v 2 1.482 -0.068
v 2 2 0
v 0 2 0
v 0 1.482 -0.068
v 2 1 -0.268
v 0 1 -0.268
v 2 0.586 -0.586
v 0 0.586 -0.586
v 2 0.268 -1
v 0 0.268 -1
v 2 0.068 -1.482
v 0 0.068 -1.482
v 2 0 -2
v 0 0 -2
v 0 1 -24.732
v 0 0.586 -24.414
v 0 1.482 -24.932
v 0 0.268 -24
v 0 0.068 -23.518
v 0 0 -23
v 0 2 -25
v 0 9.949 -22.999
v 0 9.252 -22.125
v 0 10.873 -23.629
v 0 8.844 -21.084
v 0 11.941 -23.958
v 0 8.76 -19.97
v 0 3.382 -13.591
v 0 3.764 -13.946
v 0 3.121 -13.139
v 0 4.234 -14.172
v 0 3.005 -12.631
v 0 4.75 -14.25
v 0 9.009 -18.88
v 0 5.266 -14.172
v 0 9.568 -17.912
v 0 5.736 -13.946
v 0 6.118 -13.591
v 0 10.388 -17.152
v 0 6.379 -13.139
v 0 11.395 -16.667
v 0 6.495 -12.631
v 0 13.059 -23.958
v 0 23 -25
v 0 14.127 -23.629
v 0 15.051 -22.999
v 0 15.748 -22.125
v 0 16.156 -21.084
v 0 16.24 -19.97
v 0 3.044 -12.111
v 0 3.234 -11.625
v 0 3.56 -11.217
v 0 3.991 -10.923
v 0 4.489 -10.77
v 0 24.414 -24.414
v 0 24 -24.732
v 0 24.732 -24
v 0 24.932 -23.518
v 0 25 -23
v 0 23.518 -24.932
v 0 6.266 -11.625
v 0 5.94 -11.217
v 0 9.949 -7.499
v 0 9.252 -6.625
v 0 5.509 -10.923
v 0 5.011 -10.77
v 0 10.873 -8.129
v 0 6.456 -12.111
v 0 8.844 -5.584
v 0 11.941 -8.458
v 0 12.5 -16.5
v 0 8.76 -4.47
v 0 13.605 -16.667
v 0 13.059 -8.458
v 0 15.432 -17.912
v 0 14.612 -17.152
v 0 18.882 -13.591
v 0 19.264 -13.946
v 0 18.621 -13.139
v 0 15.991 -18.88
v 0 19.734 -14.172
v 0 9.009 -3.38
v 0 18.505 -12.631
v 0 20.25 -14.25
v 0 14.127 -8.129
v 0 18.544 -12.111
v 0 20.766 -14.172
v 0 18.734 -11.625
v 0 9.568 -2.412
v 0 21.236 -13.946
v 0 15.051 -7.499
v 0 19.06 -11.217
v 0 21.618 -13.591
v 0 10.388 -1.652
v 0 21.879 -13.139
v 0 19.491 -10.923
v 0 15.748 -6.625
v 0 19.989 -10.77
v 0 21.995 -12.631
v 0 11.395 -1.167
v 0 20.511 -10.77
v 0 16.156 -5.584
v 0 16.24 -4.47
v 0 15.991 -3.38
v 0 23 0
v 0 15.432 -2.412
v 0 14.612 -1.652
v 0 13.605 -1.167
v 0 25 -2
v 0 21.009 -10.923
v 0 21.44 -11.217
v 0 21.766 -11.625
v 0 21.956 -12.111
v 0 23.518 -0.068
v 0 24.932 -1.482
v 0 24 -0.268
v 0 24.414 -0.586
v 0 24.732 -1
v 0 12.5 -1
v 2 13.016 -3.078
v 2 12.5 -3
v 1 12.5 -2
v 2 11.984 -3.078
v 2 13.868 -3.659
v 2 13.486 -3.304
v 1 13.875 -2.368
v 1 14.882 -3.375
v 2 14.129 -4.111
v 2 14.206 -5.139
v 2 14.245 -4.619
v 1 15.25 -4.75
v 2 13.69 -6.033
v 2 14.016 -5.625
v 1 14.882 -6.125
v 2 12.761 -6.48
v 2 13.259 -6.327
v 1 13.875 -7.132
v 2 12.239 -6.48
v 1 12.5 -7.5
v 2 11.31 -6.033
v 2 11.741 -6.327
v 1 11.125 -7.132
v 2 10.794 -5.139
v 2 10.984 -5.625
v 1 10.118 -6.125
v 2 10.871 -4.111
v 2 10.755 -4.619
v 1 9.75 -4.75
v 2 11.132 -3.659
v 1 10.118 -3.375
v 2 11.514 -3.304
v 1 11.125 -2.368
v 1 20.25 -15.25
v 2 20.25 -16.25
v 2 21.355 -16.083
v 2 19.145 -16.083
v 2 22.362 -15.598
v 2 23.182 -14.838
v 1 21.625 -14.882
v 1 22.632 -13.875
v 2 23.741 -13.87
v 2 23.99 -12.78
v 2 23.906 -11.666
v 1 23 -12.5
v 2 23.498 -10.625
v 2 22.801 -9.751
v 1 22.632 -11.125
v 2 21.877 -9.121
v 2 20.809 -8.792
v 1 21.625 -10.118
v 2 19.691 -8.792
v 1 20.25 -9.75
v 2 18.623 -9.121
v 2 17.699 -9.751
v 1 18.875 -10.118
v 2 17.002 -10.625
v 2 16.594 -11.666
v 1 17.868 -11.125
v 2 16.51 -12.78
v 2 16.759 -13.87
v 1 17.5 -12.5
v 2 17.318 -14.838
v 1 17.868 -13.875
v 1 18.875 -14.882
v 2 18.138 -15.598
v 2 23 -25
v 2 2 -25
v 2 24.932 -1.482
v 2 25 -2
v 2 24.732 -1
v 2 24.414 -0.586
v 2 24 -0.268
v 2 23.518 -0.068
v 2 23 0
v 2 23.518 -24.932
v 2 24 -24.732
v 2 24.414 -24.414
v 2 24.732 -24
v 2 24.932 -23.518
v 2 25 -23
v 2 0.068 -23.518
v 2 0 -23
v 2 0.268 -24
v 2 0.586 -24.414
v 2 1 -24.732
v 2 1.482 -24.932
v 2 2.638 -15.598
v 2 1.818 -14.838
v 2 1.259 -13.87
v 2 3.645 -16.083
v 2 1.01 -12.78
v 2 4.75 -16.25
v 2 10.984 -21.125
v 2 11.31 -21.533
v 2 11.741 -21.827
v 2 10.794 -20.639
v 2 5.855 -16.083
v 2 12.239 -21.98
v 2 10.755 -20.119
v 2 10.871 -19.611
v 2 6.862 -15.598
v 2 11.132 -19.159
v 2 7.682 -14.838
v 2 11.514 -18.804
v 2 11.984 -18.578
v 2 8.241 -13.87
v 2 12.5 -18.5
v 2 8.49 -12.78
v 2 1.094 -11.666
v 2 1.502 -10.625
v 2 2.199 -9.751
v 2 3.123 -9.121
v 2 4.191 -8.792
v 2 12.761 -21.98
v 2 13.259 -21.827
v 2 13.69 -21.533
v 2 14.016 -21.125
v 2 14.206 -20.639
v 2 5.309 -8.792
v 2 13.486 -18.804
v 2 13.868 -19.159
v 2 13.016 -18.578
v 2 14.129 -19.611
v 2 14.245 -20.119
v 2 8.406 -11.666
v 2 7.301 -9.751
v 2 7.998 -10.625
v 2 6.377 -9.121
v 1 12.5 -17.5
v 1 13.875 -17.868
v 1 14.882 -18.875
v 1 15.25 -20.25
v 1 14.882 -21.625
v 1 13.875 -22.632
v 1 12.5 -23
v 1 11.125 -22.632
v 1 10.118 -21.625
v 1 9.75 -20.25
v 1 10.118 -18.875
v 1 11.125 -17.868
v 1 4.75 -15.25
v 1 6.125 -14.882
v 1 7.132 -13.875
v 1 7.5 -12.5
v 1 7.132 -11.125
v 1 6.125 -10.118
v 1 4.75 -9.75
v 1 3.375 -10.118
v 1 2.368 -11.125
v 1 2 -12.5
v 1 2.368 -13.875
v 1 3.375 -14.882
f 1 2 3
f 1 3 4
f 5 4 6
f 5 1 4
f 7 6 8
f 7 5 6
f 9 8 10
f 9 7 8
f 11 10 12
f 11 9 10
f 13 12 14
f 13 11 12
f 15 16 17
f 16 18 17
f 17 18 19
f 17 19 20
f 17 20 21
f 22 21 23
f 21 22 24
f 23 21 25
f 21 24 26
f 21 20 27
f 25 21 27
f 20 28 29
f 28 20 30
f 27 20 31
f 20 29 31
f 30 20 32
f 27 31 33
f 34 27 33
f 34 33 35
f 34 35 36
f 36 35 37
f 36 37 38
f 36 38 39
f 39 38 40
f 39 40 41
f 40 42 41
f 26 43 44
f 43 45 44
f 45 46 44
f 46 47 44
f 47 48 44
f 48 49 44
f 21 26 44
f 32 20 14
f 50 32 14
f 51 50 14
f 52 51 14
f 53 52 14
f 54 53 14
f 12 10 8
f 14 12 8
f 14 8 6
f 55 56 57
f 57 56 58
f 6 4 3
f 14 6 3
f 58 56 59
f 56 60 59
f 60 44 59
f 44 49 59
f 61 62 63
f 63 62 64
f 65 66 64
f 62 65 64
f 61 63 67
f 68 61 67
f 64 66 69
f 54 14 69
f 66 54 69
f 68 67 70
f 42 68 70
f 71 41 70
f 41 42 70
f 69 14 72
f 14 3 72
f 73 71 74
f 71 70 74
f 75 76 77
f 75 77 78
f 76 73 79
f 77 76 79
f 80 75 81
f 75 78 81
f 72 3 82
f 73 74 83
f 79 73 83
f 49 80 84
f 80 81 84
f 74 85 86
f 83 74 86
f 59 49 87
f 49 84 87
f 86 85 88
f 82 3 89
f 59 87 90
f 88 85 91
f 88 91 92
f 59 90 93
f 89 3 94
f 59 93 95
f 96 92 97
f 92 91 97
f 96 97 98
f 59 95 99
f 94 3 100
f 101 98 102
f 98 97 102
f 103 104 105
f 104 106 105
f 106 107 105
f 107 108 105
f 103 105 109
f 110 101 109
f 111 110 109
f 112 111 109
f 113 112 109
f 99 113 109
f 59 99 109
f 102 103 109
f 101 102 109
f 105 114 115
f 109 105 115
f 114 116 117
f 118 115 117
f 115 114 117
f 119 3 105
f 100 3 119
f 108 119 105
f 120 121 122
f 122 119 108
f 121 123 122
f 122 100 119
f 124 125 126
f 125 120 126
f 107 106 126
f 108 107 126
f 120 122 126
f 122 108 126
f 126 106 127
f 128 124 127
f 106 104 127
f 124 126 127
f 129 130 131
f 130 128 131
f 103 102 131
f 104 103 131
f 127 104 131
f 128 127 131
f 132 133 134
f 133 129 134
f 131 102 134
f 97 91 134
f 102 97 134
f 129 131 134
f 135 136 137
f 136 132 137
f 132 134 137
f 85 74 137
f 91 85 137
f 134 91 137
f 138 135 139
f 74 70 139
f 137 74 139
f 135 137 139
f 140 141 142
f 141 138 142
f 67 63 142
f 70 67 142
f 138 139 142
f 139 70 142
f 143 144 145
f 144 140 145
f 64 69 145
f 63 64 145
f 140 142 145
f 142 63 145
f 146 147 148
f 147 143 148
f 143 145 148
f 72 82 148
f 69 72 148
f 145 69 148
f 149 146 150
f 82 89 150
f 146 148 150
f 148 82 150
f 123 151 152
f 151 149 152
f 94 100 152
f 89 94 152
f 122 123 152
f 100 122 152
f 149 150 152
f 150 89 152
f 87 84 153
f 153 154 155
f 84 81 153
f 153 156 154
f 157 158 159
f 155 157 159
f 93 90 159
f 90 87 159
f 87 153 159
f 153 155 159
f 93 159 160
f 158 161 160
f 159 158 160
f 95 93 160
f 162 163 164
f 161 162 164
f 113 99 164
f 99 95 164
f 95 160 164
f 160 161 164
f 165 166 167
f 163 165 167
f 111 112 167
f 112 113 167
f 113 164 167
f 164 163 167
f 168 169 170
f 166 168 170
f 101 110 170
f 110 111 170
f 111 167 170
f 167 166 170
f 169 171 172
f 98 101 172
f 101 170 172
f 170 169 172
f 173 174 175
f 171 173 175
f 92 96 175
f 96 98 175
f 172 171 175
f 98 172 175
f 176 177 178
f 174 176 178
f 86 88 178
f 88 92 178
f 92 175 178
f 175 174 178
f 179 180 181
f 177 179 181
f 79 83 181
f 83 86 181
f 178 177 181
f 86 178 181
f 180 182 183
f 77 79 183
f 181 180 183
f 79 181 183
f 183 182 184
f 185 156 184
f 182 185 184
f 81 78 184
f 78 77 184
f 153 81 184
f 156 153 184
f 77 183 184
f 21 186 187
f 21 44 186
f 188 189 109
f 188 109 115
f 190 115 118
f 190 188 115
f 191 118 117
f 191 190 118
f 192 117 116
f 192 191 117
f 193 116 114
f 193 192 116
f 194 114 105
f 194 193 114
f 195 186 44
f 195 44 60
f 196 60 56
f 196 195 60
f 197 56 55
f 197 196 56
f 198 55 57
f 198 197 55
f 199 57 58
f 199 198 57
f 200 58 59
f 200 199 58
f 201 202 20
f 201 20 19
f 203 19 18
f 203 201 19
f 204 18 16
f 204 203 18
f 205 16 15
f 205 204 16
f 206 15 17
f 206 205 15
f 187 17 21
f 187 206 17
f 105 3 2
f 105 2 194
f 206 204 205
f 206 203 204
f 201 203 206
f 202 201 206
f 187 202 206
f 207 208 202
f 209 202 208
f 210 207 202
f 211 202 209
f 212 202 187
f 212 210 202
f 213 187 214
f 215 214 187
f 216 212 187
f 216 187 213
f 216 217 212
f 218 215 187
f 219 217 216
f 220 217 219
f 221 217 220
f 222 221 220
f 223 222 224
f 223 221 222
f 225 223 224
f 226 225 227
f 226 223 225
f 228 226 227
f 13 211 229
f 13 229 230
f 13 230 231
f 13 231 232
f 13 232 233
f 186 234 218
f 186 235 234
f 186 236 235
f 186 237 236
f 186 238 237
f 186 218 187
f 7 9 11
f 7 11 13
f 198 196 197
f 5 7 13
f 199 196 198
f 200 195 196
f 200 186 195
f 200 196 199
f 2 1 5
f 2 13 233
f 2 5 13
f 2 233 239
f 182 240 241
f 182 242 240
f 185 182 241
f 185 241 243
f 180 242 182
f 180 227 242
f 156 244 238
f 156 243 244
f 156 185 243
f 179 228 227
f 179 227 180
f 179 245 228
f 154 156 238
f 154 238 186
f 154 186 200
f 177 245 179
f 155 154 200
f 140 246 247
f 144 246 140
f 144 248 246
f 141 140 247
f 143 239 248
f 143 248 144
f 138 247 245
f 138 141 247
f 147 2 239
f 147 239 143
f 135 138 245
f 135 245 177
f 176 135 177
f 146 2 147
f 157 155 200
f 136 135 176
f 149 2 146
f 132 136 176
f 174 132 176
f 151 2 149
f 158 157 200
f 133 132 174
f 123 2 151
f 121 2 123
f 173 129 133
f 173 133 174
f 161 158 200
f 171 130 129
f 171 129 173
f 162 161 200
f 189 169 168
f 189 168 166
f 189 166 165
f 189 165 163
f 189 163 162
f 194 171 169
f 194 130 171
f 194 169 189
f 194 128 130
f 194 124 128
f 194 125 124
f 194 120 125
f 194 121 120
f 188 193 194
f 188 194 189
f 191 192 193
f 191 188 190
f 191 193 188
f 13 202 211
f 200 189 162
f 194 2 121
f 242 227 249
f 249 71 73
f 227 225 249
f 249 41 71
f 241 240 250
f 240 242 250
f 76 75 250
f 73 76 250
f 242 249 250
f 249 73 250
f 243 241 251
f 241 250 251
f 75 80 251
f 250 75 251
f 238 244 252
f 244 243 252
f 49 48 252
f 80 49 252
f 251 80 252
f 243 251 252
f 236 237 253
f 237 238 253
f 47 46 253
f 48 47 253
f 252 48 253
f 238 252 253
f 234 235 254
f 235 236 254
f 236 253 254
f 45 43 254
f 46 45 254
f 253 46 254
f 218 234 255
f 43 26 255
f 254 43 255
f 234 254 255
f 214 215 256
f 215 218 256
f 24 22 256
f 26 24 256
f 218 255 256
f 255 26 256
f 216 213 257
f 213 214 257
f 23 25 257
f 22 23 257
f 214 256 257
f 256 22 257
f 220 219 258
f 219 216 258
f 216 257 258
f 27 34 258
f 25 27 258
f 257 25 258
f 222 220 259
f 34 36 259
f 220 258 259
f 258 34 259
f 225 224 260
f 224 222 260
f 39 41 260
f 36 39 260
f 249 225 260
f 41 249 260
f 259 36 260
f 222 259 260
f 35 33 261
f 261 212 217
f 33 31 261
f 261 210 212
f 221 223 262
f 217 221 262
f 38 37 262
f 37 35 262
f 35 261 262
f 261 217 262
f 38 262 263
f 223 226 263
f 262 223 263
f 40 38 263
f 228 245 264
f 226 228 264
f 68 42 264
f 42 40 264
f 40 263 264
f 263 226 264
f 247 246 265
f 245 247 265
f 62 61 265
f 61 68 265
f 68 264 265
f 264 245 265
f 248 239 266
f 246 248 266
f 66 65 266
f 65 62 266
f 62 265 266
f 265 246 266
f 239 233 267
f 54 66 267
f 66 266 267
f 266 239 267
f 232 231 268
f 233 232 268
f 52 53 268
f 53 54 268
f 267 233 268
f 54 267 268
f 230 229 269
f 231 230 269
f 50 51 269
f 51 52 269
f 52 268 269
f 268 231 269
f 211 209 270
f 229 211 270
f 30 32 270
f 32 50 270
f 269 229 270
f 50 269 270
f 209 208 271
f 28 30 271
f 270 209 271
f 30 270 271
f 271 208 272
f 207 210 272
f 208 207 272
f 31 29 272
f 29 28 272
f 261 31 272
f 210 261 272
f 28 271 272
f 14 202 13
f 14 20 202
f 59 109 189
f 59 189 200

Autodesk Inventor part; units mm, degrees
ref_plane "YZ Plane" through (0, 0, 0) normal (1, 0, 0) x (0, 1, 0)
ref_plane "XZ Plane" through (0, 0, 0) normal (0, 1, 0) x (-1, 0, 0)
ref_plane "XY Plane" through (0, 0, 0) normal (0, 0, 1) x (1, 0, 0)
sketch "Esboço1" plane through (0, 0, 0) normal (1, 0, 0) x (0, 1, 0)
  line L0 (0, 0) -> (25, 0)
  line L1 (25, 0) -> (25, -25)
  line L2 (25, -25) -> (0, -25)
  line L3 (0, -25) -> (0, 0)
  dimension "d0" = 25
  dimension "d1" = 25
extrude "Extrusão1" add sketch "Esboço1" along normal blind 2
fillet "Arredondamento1" radius 2 1 edges at (1, 25, 0)
fillet "Arredondamento2" radius 2 1 edges at (1, 0, 0)
fillet "Arredondamento3" radius 2 1 edges at (1, 25, -25)
fillet "Arredondamento4" radius 2 1 edges at (1, 0, -25)
sketch "Esboço2" plane through (2, 0, 0) normal (1, 0, 0) x (0, 0, -1)
  line L0 (23, 25) -> (2, 25) projected
  line L1 (2, 0) -> (23, 0) projected
  line L2 (0, 23) -> (0, 2) projected
  line L3 (0, 12.5) -> (4.75, 12.5)
  line L4 (25, 2) -> (25, 23) projected
  line L5 (25, 12.5) -> (20.25, 12.5)
  point P0 (0, 0)
  point P1 (12.5, 20.25)
  point P2 (12.5, 4.75)
  dimension "d11" = 4.75
  dimension "d12" = 4.75
hole "Furo1" at (2, 20.25, -12.5) at (2, 4.75, -12.5) direction (-1, 0, 0) diameter 3.242 depth 4 countersink diameter 7.5 countersink angle 90 thread size "M4x0.7" class "6H" standard "ANSI Metric M Profile"
sketch "Esboço3" plane through (0, 0, 0) normal (-1, 0, 0) x (0, 0, 1)
  line L0 (-25, 2) -> (-25, 23) projected
  line L1 (-25, 12.5) -> (-20.25, 12.5)
  line L2 (0, 23) -> (0, 2) projected
  line L3 (0, 12.5) -> (-4.75, 12.5)
  point P0 (0, 0)
  dimension "d20" = 4.75
  dimension "d21" = 4.75
hole "Furo2" at (0, 12.5, -20.25) at (0, 12.5, -4.75) direction (1, 0, 0) diameter 3.242 depth 4 countersink diameter 7.5 countersink angle 90 thread size "M4x0.7" class "6H" standard "ANSI Metric M Profile"
properties part number "TRILHO FRONTAL"
